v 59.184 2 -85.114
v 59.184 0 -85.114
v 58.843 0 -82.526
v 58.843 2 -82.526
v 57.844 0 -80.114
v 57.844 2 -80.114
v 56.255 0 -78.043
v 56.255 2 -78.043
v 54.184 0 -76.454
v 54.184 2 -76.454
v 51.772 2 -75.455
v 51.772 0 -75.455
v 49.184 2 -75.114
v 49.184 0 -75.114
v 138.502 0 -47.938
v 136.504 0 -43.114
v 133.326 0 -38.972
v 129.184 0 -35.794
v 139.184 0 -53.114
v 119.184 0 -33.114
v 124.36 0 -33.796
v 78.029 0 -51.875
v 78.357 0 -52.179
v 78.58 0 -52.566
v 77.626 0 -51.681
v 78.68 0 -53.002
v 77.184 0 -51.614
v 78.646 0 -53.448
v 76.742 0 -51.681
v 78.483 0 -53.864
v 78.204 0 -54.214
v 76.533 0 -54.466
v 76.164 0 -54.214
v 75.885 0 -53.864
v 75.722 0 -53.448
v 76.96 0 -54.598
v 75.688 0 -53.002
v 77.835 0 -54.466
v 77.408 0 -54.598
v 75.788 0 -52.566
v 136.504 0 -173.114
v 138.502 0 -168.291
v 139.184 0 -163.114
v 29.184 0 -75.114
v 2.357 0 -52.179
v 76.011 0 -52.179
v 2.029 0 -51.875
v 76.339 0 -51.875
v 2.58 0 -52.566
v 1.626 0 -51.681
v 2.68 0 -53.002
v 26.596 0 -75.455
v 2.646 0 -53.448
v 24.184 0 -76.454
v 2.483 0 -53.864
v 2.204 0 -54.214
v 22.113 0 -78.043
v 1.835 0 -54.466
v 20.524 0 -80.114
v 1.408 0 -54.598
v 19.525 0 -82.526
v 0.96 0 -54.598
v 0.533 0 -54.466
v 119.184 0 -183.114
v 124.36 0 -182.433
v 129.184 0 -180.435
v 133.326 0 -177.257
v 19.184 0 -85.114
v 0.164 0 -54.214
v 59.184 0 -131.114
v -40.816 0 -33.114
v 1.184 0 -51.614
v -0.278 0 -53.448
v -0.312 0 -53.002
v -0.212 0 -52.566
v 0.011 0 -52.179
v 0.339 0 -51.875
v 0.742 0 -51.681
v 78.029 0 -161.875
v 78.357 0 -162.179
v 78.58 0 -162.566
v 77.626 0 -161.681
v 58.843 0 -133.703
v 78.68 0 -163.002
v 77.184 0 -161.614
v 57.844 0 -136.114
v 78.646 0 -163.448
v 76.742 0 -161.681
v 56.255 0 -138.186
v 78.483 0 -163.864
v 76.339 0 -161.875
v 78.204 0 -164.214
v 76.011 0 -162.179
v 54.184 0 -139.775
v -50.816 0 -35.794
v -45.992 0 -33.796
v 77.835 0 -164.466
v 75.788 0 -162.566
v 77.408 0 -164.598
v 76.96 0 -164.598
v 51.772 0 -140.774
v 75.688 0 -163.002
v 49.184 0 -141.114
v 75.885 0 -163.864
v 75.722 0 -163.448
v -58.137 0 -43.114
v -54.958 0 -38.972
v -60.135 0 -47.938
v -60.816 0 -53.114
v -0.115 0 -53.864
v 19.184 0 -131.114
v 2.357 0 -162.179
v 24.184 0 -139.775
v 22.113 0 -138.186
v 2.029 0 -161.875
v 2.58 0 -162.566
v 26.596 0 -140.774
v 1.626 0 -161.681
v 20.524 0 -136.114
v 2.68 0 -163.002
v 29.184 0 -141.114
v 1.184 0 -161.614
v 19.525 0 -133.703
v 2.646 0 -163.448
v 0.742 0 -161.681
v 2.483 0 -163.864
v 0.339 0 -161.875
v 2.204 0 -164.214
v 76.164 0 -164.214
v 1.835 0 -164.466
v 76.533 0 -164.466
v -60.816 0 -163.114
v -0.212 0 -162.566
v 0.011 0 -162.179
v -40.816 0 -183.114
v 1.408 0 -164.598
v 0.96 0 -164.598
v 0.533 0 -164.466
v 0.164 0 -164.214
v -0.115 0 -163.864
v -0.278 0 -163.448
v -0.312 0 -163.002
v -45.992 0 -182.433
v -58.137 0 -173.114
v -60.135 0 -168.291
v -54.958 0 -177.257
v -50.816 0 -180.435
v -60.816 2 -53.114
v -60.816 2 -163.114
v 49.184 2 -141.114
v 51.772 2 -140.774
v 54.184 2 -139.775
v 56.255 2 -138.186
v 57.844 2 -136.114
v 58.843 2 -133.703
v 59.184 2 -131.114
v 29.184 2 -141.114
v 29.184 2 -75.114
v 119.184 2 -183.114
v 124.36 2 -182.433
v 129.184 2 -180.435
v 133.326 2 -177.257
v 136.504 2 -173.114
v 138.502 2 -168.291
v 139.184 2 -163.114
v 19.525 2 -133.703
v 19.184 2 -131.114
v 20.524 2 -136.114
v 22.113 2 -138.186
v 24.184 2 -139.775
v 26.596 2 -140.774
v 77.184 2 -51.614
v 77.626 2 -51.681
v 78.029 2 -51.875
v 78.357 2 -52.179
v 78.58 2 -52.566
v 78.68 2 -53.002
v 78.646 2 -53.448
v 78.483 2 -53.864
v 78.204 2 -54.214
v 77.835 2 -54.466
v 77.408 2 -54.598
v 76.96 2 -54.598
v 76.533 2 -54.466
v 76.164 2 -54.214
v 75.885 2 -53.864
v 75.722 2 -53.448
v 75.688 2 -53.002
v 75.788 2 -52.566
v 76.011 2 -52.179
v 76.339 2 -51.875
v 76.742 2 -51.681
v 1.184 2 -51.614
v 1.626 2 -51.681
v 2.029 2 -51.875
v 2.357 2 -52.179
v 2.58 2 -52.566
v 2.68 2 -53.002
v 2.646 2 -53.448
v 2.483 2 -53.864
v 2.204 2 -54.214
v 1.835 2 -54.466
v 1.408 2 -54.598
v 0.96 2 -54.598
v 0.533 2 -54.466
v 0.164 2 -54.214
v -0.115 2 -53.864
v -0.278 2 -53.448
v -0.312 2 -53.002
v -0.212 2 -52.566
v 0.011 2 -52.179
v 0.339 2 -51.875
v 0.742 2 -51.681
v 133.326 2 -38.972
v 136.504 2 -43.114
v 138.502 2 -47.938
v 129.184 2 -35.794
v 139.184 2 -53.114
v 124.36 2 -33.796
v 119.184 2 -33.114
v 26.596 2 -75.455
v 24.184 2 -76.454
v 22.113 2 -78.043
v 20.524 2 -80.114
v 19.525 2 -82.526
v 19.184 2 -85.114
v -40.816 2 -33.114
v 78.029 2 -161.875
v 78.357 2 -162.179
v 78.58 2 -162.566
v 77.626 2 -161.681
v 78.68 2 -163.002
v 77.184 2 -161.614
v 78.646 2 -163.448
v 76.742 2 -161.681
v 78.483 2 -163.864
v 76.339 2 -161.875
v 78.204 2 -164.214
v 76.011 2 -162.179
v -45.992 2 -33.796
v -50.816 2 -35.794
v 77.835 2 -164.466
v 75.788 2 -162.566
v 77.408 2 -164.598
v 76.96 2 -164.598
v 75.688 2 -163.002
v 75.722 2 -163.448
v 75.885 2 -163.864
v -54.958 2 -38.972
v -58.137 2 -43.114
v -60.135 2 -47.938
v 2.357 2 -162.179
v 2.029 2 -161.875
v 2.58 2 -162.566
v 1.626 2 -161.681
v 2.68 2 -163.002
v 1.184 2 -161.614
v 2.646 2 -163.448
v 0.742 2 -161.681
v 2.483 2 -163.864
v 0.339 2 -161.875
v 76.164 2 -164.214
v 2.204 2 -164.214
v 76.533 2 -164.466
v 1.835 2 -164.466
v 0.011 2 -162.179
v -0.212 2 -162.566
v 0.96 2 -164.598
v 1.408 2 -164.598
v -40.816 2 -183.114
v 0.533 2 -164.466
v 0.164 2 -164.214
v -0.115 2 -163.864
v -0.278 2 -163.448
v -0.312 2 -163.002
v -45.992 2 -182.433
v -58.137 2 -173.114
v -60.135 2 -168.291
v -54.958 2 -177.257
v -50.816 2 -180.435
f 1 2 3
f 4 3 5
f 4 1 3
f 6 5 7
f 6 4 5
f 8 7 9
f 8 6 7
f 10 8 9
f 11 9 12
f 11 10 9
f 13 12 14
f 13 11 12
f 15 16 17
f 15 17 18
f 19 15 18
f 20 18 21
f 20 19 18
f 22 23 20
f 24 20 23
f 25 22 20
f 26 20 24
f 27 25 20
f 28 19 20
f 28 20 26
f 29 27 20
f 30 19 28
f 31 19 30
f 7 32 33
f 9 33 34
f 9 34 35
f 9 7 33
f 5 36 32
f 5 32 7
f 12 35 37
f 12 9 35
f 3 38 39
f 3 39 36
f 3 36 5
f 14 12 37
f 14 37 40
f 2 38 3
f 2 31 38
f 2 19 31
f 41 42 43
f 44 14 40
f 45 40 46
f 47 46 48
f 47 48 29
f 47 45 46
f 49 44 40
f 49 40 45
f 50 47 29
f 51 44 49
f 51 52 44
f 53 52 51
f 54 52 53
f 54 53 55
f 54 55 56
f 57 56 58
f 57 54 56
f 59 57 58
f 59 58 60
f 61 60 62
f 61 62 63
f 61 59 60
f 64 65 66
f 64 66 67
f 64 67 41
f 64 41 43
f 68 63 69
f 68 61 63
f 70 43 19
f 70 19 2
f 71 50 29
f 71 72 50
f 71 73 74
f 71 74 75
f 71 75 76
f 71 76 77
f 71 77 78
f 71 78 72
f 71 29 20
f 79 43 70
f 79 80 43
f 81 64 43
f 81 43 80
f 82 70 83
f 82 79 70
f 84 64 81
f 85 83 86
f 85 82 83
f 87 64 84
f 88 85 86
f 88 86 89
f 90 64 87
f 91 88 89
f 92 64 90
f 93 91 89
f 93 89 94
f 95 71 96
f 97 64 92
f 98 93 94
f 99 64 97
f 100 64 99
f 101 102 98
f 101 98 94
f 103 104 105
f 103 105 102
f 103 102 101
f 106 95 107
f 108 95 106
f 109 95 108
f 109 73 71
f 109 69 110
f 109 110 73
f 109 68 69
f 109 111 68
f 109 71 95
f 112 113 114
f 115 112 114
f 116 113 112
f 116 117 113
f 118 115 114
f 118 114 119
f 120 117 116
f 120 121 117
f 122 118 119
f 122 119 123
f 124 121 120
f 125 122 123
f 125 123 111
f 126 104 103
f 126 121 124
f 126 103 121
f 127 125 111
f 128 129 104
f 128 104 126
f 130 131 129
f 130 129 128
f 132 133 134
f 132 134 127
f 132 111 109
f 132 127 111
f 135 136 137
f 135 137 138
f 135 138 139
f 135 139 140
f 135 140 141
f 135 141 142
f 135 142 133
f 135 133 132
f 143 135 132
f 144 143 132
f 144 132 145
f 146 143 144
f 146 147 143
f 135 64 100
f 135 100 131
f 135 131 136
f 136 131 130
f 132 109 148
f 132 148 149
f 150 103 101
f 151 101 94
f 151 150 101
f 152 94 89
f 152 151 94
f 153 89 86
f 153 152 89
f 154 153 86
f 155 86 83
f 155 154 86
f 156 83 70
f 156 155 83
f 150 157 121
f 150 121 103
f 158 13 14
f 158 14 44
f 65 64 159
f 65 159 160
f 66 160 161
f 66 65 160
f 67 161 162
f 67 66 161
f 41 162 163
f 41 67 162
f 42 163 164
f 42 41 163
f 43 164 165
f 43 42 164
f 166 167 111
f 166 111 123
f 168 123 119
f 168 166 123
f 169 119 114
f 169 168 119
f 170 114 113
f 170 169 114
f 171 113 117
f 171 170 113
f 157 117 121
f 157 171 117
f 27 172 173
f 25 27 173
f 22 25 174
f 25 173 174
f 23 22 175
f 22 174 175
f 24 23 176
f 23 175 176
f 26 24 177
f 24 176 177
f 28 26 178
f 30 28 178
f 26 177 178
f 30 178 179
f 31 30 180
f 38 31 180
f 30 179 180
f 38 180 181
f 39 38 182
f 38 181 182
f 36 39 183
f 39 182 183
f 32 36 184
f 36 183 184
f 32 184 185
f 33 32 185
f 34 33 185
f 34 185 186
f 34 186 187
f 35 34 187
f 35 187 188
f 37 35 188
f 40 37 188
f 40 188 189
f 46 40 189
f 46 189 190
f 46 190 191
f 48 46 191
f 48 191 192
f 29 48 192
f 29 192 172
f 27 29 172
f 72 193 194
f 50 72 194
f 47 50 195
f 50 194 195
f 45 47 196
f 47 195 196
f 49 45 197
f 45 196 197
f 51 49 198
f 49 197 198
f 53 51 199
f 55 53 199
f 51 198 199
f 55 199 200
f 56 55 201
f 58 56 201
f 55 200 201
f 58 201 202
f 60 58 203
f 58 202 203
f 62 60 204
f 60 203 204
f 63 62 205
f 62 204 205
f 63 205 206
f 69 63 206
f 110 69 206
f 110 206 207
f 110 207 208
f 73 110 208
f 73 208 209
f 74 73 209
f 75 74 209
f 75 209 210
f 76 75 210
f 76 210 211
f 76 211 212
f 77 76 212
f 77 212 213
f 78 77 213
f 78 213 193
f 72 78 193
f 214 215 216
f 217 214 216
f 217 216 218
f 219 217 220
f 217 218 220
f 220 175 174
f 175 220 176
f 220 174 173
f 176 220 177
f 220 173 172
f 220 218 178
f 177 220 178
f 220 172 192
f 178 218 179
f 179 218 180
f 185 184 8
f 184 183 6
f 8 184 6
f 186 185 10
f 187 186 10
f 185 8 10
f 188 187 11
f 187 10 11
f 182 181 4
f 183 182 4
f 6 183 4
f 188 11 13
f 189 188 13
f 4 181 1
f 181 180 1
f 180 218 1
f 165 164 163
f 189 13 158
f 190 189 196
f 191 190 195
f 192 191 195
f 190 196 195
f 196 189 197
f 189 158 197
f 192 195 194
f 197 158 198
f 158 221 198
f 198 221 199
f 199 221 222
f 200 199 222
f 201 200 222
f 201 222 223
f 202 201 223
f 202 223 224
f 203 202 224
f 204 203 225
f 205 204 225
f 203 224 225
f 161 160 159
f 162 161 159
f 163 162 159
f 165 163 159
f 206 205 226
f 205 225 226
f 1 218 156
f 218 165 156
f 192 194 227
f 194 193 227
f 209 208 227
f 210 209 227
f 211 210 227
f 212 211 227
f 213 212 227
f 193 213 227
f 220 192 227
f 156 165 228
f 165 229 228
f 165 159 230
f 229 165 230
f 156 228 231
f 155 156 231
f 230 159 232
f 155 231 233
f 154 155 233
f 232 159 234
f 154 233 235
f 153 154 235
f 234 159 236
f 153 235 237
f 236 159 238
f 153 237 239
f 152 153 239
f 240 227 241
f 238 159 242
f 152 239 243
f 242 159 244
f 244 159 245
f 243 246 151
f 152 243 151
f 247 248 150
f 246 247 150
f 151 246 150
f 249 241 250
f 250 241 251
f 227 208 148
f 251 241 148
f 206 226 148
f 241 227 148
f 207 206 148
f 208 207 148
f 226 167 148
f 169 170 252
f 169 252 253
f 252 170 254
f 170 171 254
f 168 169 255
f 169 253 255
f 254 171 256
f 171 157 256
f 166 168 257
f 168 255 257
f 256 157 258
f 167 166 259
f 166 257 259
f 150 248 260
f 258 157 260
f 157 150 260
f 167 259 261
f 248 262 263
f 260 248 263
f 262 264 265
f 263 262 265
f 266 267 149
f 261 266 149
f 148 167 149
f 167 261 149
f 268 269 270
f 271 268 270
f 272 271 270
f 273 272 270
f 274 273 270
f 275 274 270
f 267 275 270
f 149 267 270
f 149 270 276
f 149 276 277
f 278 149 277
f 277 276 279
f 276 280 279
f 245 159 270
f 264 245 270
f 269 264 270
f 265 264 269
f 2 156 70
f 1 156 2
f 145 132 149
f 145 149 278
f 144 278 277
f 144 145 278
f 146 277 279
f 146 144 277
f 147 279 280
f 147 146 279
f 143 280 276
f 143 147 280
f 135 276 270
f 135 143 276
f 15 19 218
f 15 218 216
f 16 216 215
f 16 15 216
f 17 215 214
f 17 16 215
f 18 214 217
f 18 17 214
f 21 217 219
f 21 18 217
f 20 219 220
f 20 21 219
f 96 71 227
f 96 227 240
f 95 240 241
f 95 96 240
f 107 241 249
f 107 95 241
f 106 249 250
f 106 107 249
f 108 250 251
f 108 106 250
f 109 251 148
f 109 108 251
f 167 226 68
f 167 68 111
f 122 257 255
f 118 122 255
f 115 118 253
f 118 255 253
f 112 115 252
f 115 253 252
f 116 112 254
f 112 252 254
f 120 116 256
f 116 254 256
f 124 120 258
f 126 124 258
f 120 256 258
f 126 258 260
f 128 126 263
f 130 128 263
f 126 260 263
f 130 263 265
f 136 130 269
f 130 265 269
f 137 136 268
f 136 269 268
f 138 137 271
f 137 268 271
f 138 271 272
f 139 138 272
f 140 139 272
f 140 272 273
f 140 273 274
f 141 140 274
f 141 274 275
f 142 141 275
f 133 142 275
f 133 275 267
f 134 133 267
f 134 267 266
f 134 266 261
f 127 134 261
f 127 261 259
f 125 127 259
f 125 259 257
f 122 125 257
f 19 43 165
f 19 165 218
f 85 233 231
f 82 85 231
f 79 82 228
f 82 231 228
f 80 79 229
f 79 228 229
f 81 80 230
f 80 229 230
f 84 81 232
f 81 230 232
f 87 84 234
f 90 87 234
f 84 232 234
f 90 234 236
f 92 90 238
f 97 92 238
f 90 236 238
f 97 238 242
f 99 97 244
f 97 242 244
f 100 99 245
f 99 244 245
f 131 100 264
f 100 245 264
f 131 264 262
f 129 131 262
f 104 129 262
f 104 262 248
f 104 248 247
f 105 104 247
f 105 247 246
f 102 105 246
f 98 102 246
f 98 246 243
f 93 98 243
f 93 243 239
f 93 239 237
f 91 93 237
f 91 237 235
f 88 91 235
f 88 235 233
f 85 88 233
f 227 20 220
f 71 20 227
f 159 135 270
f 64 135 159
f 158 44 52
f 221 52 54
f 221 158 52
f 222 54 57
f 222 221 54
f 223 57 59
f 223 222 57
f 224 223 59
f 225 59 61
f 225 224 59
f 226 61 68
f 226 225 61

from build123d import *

# Parameters (mm, degrees)
RESSALTO_EXTRUS_O1_DEPTH = 2
ESBO_O2_R                = 1.5
CORTE_EXTRUS_O1_DEPTH    = 10
CORTE_EXTRUS_O2_DEPTH    = 10


with BuildPart() as part:
    # Esboço1 → Ressalto-extrusão1 (new body)
    with BuildSketch(Plane(origin=(0, 0, 0), x_dir=(1, 0, 0), z_dir=(0, 1, 0))):
        with BuildLine():
            Line((-40.816022398, 183.1144834), (119.183977602, 183.1144834))
            ThreePointArc((119.183977602, 183.1144834), (133.326113225, 177.256619024), (139.183977602, 163.1144834))
            Line((139.183977602, 163.1144834), (139.183977602, 53.1144834))
            ThreePointArc((139.183977602, 53.1144834), (133.326113225, 38.972347776), (119.183977602, 33.1144834))
            Line((119.183977602, 33.1144834), (-40.816022398, 33.1144834))
            ThreePointArc((-40.816022398, 33.1144834), (-54.958158022, 38.972347776), (-60.816022398, 53.1144834))
            Line((-60.816022398, 53.1144834), (-60.816022398, 163.1144834))
            ThreePointArc((-60.816022398, 163.1144834), (-54.958158022, 177.256619024), (-40.816022398, 183.1144834))
        make_face()
    extrude(amount=RESSALTO_EXTRUS_O1_DEPTH)

    # Esboço2 → Corte-extrusão1 (cut)
    with BuildSketch(Plane(origin=(0, 2, 0), x_dir=(1, 0, 0), z_dir=(0, 1, 0))):
        with Locations(Location((1.183977602, 163.1144834, 0), (0, 0, 270))):
            Circle(ESBO_O2_R)
        with Locations(Location((77.183977602, 163.1144834, 0), (0, 0, 270))):
            Circle(ESBO_O2_R)
        with Locations(Location((77.183977602, 53.1144834, 0), (0, 0, 270))):
            Circle(ESBO_O2_R)
        with Locations(Location((1.183977602, 53.1144834, 0), (0, 0, 270))):
            Circle(ESBO_O2_R)
    extrude(amount=-CORTE_EXTRUS_O1_DEPTH, mode=Mode.SUBTRACT)

    # Esboço3 → Corte-extrusão2 (cut)
    with BuildSketch(Plane(origin=(0, 2, 0), x_dir=(1, 0, 0), z_dir=(0, 1, 0))):
        with BuildLine():
            Line((29.183977602, 141.1144834), (49.183977602, 141.1144834))
            ThreePointArc((49.183977602, 141.1144834), (56.255045413, 138.185551212), (59.183977602, 131.1144834))
            Line((59.183977602, 131.1144834), (59.183977602, 85.1144834))
            ThreePointArc((59.183977602, 85.1144834), (56.255045413, 78.043415588), (49.183977602, 75.1144834))
            Line((49.183977602, 75.1144834), (29.183977602, 75.1144834))
            ThreePointArc((29.183977602, 75.1144834), (22.11290979, 78.043415588), (19.183977602, 85.1144834))
            Line((19.183977602, 85.1144834), (19.183977602, 131.1144834))
            ThreePointArc((19.183977602, 131.1144834), (22.11290979, 138.185551212), (29.183977602, 141.1144834))
        make_face()
    extrude(amount=-CORTE_EXTRUS_O2_DEPTH, mode=Mode.SUBTRACT)


solid = part.part
